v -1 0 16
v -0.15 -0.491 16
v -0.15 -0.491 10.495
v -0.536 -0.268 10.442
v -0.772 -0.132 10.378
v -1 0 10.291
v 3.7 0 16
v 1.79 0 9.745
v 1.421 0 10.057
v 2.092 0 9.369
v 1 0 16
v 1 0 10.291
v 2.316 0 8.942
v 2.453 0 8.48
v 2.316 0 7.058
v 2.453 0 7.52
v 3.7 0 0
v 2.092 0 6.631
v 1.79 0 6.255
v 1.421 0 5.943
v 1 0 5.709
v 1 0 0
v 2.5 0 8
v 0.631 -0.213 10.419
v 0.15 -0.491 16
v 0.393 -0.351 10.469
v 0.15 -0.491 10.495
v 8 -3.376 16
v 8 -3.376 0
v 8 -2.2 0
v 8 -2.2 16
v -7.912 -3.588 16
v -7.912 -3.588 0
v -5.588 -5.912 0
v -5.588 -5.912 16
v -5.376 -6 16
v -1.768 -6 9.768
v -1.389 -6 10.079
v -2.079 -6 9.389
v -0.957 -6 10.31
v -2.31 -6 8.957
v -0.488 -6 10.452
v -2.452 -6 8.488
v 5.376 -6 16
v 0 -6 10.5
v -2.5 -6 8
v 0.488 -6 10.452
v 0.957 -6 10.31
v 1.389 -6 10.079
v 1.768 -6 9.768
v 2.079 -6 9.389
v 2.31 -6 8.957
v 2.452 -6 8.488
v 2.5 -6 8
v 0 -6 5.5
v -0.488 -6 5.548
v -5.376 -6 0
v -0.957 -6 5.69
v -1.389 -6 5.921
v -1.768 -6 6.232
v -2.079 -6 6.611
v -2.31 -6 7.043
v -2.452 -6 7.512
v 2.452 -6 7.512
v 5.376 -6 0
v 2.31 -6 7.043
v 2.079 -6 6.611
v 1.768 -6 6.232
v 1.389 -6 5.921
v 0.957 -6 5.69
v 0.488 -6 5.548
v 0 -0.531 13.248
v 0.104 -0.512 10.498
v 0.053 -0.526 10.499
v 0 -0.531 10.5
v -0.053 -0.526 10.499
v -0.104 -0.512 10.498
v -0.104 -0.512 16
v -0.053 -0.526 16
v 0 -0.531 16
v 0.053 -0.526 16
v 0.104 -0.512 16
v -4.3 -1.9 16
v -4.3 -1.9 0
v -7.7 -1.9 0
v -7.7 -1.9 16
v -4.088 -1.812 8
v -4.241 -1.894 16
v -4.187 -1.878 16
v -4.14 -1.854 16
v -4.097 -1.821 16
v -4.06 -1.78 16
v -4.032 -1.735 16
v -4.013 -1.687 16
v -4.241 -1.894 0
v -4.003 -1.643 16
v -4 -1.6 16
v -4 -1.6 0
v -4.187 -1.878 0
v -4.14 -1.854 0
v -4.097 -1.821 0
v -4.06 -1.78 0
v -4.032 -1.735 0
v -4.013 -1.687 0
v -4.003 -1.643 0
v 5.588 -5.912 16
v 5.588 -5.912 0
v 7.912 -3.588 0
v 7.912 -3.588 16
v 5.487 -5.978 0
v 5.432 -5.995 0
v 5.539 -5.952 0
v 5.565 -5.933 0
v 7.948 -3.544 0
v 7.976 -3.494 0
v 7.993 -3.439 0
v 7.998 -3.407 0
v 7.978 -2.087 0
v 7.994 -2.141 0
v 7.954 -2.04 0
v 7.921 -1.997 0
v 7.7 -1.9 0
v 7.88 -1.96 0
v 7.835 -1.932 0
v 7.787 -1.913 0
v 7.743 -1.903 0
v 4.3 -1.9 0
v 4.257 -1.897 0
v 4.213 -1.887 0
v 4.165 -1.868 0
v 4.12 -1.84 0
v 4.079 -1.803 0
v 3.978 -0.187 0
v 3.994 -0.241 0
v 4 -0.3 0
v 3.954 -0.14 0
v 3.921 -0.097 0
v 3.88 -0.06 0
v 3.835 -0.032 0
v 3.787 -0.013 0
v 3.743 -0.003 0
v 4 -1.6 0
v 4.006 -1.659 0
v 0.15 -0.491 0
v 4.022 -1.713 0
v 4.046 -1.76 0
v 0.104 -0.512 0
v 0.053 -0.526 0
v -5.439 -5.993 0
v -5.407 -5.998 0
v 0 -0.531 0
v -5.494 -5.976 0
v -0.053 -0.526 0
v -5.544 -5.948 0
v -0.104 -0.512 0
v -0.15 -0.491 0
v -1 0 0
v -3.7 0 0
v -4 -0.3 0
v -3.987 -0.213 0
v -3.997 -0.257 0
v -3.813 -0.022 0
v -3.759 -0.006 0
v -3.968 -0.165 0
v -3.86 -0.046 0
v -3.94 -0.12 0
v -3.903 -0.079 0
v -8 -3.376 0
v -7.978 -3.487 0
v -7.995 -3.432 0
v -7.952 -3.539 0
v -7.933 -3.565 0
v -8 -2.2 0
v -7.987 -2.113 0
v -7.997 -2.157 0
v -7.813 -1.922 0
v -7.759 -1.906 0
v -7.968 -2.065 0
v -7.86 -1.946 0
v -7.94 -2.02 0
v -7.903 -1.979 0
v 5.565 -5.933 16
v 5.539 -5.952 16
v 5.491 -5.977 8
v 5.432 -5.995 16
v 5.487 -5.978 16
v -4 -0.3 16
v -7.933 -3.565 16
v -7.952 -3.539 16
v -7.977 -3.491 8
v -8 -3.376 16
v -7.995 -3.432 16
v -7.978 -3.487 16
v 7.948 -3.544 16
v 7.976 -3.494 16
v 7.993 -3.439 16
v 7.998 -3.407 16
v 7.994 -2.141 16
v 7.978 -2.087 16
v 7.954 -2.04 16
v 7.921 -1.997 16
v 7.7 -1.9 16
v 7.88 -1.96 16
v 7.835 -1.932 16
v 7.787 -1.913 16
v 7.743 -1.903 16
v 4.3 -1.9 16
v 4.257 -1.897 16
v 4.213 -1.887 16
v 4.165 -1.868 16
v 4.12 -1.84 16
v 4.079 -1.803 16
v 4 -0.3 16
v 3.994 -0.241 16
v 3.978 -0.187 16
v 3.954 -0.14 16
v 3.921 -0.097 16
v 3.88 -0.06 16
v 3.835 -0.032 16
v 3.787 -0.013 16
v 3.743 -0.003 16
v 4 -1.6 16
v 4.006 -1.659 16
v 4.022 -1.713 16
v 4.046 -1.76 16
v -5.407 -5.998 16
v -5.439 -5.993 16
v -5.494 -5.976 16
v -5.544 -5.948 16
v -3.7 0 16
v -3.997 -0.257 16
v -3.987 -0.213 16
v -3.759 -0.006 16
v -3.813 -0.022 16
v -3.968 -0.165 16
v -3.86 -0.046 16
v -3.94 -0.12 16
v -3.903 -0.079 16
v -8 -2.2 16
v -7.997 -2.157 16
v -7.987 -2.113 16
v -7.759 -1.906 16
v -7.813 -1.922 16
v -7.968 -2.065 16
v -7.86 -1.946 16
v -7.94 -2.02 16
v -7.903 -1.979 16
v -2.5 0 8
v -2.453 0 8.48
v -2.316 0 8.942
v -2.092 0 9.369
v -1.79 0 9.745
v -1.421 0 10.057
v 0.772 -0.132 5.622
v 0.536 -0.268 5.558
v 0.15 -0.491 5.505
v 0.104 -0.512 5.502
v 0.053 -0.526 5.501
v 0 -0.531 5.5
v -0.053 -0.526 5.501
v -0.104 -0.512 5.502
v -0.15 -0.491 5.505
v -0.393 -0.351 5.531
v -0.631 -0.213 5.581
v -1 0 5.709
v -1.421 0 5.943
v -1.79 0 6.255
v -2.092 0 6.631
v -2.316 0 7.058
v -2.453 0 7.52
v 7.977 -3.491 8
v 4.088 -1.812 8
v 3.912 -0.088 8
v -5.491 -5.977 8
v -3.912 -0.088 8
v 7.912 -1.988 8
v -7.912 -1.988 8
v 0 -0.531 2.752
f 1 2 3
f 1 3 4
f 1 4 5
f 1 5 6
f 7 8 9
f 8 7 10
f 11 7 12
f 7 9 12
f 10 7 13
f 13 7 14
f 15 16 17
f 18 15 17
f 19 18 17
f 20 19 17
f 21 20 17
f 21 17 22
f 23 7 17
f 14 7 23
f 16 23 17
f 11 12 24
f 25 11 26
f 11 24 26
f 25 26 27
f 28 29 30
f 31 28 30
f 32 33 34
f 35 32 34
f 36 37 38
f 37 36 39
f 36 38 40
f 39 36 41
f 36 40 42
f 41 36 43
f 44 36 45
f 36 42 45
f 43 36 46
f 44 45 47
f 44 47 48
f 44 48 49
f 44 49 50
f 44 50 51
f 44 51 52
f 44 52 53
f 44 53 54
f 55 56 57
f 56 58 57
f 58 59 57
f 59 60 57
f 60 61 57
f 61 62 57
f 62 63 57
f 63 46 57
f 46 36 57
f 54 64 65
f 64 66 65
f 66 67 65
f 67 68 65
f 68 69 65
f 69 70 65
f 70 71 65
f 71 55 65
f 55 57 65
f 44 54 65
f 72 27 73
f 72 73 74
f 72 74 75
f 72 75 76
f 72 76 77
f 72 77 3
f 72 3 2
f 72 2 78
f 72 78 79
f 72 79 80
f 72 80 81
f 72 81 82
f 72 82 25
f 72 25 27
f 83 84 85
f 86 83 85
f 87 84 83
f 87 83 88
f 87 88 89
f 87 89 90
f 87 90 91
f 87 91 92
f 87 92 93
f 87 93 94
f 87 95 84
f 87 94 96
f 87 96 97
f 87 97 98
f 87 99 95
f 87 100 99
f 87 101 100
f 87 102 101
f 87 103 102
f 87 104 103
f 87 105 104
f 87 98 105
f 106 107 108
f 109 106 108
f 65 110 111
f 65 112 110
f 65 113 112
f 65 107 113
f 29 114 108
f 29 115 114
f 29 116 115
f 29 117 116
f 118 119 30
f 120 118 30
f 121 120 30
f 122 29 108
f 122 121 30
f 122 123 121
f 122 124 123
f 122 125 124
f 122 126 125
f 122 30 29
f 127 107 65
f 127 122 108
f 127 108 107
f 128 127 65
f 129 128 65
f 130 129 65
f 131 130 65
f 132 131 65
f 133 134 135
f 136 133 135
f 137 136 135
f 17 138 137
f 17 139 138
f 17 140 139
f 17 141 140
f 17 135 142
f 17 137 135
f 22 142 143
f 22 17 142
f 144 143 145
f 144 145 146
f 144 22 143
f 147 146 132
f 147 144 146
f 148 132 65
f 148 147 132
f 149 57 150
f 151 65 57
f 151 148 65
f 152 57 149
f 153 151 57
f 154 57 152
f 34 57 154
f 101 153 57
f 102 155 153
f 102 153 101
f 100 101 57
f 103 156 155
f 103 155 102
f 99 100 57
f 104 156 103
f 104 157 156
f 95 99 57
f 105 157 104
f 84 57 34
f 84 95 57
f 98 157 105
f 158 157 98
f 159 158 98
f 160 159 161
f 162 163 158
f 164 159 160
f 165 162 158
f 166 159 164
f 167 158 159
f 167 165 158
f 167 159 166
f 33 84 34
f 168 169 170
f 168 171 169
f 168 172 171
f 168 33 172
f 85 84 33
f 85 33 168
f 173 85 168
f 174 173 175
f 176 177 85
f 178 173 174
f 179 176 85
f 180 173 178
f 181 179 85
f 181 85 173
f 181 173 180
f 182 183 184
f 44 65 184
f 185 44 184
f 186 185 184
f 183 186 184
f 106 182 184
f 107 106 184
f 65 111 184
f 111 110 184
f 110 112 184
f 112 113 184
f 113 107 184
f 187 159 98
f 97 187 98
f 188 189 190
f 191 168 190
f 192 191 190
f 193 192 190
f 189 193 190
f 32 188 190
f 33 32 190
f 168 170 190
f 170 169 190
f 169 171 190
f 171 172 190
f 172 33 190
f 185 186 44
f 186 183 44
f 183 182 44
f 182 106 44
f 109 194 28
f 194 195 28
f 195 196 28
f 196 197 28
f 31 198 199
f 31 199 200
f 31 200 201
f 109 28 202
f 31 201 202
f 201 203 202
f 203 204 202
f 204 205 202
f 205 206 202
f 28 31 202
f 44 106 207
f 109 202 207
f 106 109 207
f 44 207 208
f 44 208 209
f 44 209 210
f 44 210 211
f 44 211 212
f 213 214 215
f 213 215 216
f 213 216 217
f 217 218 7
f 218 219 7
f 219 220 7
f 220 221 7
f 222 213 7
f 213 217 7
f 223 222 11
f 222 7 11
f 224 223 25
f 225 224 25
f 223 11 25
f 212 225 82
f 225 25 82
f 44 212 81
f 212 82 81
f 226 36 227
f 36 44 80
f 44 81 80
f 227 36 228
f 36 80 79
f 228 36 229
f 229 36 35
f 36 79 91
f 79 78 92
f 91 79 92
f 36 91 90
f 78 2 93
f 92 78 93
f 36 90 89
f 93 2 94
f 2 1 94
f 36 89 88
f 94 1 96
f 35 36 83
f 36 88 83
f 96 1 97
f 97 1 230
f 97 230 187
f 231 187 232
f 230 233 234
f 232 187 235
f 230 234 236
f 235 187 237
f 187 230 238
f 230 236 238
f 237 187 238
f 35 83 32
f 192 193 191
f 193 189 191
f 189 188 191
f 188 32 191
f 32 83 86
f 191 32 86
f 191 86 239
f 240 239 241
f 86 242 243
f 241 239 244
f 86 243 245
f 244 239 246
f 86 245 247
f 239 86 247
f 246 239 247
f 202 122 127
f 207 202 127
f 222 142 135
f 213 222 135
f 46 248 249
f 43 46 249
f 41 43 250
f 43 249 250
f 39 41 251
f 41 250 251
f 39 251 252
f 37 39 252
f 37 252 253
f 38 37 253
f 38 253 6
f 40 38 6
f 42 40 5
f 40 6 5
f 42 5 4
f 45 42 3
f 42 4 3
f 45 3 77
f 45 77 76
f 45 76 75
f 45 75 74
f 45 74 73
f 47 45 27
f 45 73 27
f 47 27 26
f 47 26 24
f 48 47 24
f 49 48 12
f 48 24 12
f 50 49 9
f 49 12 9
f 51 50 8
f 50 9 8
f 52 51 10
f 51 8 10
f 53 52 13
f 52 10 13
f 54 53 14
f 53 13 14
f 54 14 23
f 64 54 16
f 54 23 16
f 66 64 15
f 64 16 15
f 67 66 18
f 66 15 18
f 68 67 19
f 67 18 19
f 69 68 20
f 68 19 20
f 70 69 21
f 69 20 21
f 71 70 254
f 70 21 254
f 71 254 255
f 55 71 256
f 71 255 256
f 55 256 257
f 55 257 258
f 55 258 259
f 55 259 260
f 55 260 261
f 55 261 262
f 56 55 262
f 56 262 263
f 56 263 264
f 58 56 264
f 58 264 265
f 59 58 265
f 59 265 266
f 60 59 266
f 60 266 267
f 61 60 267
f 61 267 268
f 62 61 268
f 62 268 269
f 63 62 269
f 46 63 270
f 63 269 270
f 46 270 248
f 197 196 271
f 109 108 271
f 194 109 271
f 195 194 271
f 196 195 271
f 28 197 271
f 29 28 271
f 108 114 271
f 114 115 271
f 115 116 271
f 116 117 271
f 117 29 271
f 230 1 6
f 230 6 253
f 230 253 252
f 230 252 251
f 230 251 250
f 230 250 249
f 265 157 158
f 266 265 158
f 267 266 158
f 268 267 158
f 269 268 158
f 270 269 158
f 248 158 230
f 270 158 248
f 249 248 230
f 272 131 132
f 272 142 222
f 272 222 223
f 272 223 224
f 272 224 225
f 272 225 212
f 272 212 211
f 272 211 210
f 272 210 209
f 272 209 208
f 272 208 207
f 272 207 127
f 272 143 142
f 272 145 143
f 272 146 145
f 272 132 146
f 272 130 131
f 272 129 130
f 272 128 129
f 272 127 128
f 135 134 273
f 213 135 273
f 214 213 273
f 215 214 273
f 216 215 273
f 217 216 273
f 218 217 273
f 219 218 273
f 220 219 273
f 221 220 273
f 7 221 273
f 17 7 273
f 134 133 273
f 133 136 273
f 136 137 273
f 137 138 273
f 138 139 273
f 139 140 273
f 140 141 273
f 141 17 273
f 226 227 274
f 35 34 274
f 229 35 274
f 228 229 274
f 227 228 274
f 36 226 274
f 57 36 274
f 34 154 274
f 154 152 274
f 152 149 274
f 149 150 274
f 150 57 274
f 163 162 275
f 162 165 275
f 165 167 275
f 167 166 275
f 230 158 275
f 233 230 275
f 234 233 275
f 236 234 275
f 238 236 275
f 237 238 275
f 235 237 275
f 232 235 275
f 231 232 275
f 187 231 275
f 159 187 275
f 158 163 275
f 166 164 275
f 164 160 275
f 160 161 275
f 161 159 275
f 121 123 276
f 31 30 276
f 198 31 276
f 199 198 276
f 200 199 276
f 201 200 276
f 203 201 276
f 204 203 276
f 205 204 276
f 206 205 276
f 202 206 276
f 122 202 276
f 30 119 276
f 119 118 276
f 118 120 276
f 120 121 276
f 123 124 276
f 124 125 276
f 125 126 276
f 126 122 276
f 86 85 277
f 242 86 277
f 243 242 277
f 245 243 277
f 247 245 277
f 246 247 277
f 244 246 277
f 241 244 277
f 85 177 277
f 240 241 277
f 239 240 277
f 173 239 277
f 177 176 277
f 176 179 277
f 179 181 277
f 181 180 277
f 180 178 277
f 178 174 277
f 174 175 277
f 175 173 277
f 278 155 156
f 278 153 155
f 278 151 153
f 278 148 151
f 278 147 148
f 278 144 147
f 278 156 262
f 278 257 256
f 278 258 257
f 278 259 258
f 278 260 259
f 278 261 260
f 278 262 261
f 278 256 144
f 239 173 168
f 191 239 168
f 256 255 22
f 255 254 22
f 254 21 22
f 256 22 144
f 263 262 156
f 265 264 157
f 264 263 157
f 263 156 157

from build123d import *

# Parameters (mm, degrees)
EXTRUDE1_DEPTH     = 16
SKETCH2_R          = 2.5
CUT_EXTRUDE1_DEPTH = 19.867962423


with BuildPart() as part:
    # Sketch1 → Extrude1 (new body)
    with BuildSketch(Plane.XY):
        with BuildLine():
            add(Edge.make_bspline(
                [(-0.15, -0.490747729), (0, -0.577350269), (0.15, -0.490747729)],
                knots=[3.665191429, 3.665191429, 3.665191429, 4.71238898, 4.71238898, 4.71238898], degree=2, weights=[1, 0.866025404, 1]))
            Line((-0.15, -0.490747729), (-1, 0))
            Line((-1, 0), (-3.7, 0))
            add(Edge.make_bspline(
                [(-3.7, 0), (-4, 0), (-4, -0.3)],
                knots=[3.141592654, 3.141592654, 3.141592654, 4.71238898, 4.71238898, 4.71238898], degree=2, weights=[1, 0.707106781, 1]))
            Line((-4, -0.3), (-4, -1.6))
            add(Edge.make_bspline(
                [(-4.3, -1.9), (-4, -1.9), (-4, -1.6)],
                knots=[4.71238898, 4.71238898, 4.71238898, 6.283185307, 6.283185307, 6.283185307], degree=2, weights=[1, 0.707106781, 1]))
            Line((-4.3, -1.9), (-7.7, -1.9))
            add(Edge.make_bspline(
                [(-7.7, -1.9), (-8, -1.9), (-8, -2.2)],
                knots=[1.570796327, 1.570796327, 1.570796327, 3.141592654, 3.141592654, 3.141592654], degree=2, weights=[1, 0.707106781, 1]))
            Line((-8, -2.2), (-8, -3.375735931))
            add(Edge.make_bspline(
                [(-8, -3.375735931), (-8, -3.5), (-7.912132034, -3.587867966)],
                knots=[0, 0, 0, 0.785398163, 0.785398163, 0.785398163], degree=2, weights=[1, 0.923879533, 1]))
            Line((-7.912132034, -3.587867966), (-5.587867966, -5.912132034))
            add(Edge.make_bspline(
                [(-5.587867966, -5.912132034), (-5.5, -6), (-5.375735931, -6)],
                knots=[1.570796327, 1.570796327, 1.570796327, 2.35619449, 2.35619449, 2.35619449], degree=2, weights=[1, 0.923879533, 1]))
            Line((-5.375735931, -6), (-2.46, -6))
            Line((-2.46, -6), (2.46, -6))
            Line((2.46, -6), (5.375735931, -6))
            add(Edge.make_bspline(
                [(5.375735931, -6), (5.5, -6), (5.587867966, -5.912132034)],
                knots=[1.570796327, 1.570796327, 1.570796327, 2.35619449, 2.35619449, 2.35619449], degree=2, weights=[1, 0.923879533, 1]))
            Line((5.587867966, -5.912132034), (7.912132034, -3.587867966))
            add(Edge.make_bspline(
                [(7.912132034, -3.587867966), (8, -3.5), (8, -3.375735931)],
                knots=[1.570796327, 1.570796327, 1.570796327, 2.35619449, 2.35619449, 2.35619449], degree=2, weights=[1, 0.923879533, 1]))
            Line((8, -3.375735931), (8, -2.2))
            add(Edge.make_bspline(
                [(8, -2.2), (8, -1.9), (7.7, -1.9)],
                knots=[0, 0, 0, 1.570796327, 1.570796327, 1.570796327], degree=2, weights=[1, 0.707106781, 1]))
            Line((7.7, -1.9), (4.3, -1.9))
            add(Edge.make_bspline(
                [(4, -1.6), (4, -1.9), (4.3, -1.9)],
                knots=[1.570796327, 1.570796327, 1.570796327, 3.141592654, 3.141592654, 3.141592654], degree=2, weights=[1, 0.707106781, 1]))
            Line((4, -1.6), (4, -0.3))
            add(Edge.make_bspline(
                [(4, -0.3), (4, 0), (3.7, 0)],
                knots=[0, 0, 0, 1.570796327, 1.570796327, 1.570796327], degree=2, weights=[1, 0.707106781, 1]))
            Line((3.7, 0), (1, 0))
            Line((1, 0), (0.15, -0.490747729))
        make_face()
    extrude(amount=EXTRUDE1_DEPTH)

    # Sketch2 → Cut-Extrude1 (cut, through all)
    with BuildSketch(Plane(origin=(0, 0, 0), x_dir=(1, 0, 0), z_dir=(0, 1, 0))):
        with Locations(Location((0, -8, 0), (0, 0, 180))):
            Circle(SKETCH2_R)
    extrude(amount=-CUT_EXTRUDE1_DEPTH, mode=Mode.SUBTRACT)


solid = part.part
